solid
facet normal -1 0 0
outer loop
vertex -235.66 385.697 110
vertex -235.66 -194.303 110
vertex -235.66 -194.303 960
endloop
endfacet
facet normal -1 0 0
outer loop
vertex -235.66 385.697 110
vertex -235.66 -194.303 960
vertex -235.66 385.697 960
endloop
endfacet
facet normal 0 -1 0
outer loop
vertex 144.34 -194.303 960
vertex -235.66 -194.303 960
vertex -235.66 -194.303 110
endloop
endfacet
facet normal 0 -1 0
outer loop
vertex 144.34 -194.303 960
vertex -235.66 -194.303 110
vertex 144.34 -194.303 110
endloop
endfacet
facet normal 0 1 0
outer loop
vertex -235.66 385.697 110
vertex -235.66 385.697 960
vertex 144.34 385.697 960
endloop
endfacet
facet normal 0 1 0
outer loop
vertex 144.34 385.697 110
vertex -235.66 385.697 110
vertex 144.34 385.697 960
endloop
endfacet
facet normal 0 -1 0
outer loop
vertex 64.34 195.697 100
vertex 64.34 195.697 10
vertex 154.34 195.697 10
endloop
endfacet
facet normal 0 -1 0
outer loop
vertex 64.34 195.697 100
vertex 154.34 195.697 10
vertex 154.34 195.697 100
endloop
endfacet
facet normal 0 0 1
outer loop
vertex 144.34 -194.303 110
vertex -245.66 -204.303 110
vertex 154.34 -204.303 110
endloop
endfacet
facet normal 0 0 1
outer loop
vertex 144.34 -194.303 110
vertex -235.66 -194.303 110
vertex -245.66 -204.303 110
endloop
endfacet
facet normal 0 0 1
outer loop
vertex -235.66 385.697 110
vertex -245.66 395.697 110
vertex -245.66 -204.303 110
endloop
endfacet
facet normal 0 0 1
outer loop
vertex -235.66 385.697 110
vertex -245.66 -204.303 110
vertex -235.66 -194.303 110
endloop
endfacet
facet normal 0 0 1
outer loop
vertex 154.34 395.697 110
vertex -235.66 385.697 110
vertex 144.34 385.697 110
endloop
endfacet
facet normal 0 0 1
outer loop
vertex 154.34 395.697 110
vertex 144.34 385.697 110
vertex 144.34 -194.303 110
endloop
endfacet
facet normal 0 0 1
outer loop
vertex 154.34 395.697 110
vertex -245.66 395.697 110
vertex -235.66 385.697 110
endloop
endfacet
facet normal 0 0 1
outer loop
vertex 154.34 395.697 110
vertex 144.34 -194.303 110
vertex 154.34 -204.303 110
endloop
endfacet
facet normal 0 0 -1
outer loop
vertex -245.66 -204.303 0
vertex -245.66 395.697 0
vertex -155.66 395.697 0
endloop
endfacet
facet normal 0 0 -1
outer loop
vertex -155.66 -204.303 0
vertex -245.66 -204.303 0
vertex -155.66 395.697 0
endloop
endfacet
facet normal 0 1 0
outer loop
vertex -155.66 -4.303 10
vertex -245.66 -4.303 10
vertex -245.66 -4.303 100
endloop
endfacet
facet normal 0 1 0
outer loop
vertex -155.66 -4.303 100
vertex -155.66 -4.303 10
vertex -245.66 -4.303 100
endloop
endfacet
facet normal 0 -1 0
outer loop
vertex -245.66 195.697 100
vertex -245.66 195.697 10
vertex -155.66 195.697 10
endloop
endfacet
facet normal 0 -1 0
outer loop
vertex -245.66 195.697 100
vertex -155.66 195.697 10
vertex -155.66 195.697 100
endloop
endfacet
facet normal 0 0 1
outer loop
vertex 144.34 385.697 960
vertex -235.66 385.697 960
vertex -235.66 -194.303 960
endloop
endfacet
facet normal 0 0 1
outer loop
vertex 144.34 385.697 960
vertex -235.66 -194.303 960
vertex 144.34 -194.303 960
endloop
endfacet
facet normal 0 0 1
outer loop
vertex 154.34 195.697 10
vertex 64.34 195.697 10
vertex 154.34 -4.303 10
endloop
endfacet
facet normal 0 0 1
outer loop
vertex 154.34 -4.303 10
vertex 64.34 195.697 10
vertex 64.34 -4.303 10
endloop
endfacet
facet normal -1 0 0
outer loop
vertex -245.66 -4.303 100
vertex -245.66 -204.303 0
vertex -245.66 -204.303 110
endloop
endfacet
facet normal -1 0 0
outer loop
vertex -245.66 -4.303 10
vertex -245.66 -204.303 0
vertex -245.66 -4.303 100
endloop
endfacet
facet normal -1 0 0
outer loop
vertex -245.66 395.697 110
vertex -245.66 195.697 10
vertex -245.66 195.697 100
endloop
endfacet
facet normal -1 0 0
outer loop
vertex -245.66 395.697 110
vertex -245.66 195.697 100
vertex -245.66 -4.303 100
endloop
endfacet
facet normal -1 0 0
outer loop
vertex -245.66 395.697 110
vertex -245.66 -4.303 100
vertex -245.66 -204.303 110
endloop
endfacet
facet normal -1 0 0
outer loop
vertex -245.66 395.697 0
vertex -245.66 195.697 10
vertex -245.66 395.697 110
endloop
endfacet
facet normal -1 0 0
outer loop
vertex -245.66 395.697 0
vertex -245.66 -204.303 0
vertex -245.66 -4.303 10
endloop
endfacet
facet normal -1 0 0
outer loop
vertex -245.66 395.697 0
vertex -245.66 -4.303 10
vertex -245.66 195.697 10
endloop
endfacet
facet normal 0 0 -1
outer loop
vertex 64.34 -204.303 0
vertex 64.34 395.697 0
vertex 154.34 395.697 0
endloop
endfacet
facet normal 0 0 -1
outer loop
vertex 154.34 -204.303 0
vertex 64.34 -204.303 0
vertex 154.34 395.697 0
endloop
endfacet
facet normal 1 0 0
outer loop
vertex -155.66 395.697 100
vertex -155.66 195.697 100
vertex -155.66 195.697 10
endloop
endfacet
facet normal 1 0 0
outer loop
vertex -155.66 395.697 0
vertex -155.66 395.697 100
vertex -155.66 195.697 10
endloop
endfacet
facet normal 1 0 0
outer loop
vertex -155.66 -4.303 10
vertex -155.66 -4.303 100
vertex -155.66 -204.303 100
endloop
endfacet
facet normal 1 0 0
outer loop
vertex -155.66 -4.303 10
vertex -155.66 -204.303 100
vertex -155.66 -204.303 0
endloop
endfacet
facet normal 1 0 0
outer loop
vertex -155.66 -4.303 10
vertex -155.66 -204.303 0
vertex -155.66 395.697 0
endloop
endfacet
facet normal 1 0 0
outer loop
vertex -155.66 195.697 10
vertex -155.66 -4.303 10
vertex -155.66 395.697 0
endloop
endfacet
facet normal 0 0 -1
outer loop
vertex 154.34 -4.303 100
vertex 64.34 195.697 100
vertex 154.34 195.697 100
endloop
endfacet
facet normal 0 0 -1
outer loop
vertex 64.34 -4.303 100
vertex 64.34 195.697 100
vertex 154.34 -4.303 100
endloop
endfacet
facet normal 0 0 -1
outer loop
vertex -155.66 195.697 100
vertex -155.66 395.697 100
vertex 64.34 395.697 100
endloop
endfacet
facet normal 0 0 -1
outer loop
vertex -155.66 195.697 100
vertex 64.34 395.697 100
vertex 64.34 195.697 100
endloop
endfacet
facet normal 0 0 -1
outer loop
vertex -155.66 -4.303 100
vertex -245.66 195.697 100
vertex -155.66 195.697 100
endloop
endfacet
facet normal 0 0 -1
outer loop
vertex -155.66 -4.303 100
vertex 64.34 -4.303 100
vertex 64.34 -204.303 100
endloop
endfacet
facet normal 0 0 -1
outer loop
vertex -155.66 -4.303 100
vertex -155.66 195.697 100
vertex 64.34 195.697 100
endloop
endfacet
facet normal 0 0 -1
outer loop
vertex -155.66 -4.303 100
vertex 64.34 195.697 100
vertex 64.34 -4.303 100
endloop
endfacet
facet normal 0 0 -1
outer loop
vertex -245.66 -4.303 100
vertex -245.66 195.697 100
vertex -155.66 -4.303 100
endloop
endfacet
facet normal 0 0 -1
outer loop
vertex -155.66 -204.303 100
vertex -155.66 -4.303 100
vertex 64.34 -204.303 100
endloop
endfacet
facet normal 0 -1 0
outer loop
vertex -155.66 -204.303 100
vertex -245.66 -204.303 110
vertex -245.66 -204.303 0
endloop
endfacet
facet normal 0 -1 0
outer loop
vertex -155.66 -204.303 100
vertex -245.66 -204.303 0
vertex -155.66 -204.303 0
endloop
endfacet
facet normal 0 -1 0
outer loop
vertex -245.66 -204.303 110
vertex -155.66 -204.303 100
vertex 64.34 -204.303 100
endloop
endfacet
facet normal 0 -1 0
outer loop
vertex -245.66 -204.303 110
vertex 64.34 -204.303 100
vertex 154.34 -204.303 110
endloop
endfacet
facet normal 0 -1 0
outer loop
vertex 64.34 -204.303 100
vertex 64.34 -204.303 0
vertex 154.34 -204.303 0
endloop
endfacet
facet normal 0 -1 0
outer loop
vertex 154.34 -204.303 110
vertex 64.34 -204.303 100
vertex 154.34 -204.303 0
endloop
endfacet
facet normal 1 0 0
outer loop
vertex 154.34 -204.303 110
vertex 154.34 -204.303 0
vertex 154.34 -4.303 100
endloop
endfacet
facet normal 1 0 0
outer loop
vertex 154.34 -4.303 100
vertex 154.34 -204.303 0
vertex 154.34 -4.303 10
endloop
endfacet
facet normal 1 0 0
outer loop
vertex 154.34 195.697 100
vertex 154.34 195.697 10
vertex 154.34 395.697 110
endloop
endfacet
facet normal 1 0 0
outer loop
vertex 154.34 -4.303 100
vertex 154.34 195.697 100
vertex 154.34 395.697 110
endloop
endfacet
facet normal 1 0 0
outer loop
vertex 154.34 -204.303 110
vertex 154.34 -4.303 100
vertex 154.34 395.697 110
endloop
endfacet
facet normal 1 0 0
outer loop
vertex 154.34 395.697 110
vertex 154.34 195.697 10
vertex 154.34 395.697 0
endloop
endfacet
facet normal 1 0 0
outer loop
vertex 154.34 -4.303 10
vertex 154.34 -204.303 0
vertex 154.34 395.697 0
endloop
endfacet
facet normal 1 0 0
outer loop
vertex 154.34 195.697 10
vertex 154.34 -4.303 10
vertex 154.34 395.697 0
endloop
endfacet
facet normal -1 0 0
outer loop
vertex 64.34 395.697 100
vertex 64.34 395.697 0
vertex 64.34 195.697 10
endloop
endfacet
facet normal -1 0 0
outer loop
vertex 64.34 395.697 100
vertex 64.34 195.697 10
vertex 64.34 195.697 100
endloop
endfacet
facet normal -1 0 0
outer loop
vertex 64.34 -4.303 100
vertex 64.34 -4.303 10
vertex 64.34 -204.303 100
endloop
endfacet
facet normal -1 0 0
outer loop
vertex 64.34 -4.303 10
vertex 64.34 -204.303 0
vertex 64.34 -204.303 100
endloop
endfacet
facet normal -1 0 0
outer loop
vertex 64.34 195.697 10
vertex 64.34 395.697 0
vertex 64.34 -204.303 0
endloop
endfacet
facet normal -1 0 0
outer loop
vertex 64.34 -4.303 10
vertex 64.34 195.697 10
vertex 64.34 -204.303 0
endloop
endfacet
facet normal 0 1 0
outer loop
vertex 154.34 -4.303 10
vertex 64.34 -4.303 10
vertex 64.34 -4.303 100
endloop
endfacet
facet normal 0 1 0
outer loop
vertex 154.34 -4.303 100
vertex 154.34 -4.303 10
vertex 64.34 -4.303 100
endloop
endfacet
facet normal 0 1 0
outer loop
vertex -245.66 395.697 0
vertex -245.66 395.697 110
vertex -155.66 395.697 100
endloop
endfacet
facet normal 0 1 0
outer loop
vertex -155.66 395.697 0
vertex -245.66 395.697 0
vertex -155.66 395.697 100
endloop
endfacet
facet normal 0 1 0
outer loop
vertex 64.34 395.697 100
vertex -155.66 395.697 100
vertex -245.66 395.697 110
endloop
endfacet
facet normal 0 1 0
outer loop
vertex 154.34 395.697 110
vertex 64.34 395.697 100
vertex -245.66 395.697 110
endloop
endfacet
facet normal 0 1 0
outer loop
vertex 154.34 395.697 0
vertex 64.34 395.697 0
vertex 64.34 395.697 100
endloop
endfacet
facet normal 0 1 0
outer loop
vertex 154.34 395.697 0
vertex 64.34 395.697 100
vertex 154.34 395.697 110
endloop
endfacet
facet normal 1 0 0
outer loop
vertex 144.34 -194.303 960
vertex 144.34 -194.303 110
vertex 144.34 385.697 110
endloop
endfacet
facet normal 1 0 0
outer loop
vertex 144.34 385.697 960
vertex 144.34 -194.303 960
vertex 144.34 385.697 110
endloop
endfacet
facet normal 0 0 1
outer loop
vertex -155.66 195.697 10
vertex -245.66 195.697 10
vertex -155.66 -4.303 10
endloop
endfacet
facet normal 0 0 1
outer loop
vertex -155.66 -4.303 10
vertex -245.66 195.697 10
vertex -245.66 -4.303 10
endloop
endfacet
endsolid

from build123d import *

# Parameters (mm, degrees)
F0_W     = 400
F0_H     = 600
F1_DEPTH = 110
F2_W     = 220
F2_H     = 100
F2_H_2   = 177.977299
F3_DEPTH = 600.001
F4_W     = 200
F4_H     = 90
F5_DEPTH = 401
F6_W     = 380
F6_H     = 580
F7_DEPTH = 850


with BuildPart() as f1:
    # F0 (on Top) → F1 (new body)
    with BuildSketch(Plane.XY):
        with Locations((-45.659611, 95.696688)):
            Rectangle(F0_W, F0_H)
    extrude(amount=F1_DEPTH)

    # F2 (on face) → F3 (cut, through all)
    with BuildSketch(Plane.XZ.offset(204.303312)):
        with Locations((-45.659611, 50)):
            Rectangle(F2_W, F2_H)
        with Locations((-45.659611, -88.988649)):
            Rectangle(F2_W, F2_H_2)
    extrude(amount=-F3_DEPTH, mode=Mode.SUBTRACT)

    # F4 (on face) → F5 (cut)
    with BuildSketch(Plane(origin=(-245.659611, 0, 0), x_dir=(0, -1, 0), z_dir=(-1, 0, 0))):
        with Locations((-95.696688, 55)):
            Rectangle(F4_W, F4_H)
    extrude(amount=-F5_DEPTH, mode=Mode.SUBTRACT)

    # F6 (on face) → F7 (join)
    with BuildSketch(Plane.XY.offset(110)):
        with Locations((-45.659611, 95.696688)):
            Rectangle(F6_W, F6_H)
    extrude(amount=F7_DEPTH)


solid = f1.part
